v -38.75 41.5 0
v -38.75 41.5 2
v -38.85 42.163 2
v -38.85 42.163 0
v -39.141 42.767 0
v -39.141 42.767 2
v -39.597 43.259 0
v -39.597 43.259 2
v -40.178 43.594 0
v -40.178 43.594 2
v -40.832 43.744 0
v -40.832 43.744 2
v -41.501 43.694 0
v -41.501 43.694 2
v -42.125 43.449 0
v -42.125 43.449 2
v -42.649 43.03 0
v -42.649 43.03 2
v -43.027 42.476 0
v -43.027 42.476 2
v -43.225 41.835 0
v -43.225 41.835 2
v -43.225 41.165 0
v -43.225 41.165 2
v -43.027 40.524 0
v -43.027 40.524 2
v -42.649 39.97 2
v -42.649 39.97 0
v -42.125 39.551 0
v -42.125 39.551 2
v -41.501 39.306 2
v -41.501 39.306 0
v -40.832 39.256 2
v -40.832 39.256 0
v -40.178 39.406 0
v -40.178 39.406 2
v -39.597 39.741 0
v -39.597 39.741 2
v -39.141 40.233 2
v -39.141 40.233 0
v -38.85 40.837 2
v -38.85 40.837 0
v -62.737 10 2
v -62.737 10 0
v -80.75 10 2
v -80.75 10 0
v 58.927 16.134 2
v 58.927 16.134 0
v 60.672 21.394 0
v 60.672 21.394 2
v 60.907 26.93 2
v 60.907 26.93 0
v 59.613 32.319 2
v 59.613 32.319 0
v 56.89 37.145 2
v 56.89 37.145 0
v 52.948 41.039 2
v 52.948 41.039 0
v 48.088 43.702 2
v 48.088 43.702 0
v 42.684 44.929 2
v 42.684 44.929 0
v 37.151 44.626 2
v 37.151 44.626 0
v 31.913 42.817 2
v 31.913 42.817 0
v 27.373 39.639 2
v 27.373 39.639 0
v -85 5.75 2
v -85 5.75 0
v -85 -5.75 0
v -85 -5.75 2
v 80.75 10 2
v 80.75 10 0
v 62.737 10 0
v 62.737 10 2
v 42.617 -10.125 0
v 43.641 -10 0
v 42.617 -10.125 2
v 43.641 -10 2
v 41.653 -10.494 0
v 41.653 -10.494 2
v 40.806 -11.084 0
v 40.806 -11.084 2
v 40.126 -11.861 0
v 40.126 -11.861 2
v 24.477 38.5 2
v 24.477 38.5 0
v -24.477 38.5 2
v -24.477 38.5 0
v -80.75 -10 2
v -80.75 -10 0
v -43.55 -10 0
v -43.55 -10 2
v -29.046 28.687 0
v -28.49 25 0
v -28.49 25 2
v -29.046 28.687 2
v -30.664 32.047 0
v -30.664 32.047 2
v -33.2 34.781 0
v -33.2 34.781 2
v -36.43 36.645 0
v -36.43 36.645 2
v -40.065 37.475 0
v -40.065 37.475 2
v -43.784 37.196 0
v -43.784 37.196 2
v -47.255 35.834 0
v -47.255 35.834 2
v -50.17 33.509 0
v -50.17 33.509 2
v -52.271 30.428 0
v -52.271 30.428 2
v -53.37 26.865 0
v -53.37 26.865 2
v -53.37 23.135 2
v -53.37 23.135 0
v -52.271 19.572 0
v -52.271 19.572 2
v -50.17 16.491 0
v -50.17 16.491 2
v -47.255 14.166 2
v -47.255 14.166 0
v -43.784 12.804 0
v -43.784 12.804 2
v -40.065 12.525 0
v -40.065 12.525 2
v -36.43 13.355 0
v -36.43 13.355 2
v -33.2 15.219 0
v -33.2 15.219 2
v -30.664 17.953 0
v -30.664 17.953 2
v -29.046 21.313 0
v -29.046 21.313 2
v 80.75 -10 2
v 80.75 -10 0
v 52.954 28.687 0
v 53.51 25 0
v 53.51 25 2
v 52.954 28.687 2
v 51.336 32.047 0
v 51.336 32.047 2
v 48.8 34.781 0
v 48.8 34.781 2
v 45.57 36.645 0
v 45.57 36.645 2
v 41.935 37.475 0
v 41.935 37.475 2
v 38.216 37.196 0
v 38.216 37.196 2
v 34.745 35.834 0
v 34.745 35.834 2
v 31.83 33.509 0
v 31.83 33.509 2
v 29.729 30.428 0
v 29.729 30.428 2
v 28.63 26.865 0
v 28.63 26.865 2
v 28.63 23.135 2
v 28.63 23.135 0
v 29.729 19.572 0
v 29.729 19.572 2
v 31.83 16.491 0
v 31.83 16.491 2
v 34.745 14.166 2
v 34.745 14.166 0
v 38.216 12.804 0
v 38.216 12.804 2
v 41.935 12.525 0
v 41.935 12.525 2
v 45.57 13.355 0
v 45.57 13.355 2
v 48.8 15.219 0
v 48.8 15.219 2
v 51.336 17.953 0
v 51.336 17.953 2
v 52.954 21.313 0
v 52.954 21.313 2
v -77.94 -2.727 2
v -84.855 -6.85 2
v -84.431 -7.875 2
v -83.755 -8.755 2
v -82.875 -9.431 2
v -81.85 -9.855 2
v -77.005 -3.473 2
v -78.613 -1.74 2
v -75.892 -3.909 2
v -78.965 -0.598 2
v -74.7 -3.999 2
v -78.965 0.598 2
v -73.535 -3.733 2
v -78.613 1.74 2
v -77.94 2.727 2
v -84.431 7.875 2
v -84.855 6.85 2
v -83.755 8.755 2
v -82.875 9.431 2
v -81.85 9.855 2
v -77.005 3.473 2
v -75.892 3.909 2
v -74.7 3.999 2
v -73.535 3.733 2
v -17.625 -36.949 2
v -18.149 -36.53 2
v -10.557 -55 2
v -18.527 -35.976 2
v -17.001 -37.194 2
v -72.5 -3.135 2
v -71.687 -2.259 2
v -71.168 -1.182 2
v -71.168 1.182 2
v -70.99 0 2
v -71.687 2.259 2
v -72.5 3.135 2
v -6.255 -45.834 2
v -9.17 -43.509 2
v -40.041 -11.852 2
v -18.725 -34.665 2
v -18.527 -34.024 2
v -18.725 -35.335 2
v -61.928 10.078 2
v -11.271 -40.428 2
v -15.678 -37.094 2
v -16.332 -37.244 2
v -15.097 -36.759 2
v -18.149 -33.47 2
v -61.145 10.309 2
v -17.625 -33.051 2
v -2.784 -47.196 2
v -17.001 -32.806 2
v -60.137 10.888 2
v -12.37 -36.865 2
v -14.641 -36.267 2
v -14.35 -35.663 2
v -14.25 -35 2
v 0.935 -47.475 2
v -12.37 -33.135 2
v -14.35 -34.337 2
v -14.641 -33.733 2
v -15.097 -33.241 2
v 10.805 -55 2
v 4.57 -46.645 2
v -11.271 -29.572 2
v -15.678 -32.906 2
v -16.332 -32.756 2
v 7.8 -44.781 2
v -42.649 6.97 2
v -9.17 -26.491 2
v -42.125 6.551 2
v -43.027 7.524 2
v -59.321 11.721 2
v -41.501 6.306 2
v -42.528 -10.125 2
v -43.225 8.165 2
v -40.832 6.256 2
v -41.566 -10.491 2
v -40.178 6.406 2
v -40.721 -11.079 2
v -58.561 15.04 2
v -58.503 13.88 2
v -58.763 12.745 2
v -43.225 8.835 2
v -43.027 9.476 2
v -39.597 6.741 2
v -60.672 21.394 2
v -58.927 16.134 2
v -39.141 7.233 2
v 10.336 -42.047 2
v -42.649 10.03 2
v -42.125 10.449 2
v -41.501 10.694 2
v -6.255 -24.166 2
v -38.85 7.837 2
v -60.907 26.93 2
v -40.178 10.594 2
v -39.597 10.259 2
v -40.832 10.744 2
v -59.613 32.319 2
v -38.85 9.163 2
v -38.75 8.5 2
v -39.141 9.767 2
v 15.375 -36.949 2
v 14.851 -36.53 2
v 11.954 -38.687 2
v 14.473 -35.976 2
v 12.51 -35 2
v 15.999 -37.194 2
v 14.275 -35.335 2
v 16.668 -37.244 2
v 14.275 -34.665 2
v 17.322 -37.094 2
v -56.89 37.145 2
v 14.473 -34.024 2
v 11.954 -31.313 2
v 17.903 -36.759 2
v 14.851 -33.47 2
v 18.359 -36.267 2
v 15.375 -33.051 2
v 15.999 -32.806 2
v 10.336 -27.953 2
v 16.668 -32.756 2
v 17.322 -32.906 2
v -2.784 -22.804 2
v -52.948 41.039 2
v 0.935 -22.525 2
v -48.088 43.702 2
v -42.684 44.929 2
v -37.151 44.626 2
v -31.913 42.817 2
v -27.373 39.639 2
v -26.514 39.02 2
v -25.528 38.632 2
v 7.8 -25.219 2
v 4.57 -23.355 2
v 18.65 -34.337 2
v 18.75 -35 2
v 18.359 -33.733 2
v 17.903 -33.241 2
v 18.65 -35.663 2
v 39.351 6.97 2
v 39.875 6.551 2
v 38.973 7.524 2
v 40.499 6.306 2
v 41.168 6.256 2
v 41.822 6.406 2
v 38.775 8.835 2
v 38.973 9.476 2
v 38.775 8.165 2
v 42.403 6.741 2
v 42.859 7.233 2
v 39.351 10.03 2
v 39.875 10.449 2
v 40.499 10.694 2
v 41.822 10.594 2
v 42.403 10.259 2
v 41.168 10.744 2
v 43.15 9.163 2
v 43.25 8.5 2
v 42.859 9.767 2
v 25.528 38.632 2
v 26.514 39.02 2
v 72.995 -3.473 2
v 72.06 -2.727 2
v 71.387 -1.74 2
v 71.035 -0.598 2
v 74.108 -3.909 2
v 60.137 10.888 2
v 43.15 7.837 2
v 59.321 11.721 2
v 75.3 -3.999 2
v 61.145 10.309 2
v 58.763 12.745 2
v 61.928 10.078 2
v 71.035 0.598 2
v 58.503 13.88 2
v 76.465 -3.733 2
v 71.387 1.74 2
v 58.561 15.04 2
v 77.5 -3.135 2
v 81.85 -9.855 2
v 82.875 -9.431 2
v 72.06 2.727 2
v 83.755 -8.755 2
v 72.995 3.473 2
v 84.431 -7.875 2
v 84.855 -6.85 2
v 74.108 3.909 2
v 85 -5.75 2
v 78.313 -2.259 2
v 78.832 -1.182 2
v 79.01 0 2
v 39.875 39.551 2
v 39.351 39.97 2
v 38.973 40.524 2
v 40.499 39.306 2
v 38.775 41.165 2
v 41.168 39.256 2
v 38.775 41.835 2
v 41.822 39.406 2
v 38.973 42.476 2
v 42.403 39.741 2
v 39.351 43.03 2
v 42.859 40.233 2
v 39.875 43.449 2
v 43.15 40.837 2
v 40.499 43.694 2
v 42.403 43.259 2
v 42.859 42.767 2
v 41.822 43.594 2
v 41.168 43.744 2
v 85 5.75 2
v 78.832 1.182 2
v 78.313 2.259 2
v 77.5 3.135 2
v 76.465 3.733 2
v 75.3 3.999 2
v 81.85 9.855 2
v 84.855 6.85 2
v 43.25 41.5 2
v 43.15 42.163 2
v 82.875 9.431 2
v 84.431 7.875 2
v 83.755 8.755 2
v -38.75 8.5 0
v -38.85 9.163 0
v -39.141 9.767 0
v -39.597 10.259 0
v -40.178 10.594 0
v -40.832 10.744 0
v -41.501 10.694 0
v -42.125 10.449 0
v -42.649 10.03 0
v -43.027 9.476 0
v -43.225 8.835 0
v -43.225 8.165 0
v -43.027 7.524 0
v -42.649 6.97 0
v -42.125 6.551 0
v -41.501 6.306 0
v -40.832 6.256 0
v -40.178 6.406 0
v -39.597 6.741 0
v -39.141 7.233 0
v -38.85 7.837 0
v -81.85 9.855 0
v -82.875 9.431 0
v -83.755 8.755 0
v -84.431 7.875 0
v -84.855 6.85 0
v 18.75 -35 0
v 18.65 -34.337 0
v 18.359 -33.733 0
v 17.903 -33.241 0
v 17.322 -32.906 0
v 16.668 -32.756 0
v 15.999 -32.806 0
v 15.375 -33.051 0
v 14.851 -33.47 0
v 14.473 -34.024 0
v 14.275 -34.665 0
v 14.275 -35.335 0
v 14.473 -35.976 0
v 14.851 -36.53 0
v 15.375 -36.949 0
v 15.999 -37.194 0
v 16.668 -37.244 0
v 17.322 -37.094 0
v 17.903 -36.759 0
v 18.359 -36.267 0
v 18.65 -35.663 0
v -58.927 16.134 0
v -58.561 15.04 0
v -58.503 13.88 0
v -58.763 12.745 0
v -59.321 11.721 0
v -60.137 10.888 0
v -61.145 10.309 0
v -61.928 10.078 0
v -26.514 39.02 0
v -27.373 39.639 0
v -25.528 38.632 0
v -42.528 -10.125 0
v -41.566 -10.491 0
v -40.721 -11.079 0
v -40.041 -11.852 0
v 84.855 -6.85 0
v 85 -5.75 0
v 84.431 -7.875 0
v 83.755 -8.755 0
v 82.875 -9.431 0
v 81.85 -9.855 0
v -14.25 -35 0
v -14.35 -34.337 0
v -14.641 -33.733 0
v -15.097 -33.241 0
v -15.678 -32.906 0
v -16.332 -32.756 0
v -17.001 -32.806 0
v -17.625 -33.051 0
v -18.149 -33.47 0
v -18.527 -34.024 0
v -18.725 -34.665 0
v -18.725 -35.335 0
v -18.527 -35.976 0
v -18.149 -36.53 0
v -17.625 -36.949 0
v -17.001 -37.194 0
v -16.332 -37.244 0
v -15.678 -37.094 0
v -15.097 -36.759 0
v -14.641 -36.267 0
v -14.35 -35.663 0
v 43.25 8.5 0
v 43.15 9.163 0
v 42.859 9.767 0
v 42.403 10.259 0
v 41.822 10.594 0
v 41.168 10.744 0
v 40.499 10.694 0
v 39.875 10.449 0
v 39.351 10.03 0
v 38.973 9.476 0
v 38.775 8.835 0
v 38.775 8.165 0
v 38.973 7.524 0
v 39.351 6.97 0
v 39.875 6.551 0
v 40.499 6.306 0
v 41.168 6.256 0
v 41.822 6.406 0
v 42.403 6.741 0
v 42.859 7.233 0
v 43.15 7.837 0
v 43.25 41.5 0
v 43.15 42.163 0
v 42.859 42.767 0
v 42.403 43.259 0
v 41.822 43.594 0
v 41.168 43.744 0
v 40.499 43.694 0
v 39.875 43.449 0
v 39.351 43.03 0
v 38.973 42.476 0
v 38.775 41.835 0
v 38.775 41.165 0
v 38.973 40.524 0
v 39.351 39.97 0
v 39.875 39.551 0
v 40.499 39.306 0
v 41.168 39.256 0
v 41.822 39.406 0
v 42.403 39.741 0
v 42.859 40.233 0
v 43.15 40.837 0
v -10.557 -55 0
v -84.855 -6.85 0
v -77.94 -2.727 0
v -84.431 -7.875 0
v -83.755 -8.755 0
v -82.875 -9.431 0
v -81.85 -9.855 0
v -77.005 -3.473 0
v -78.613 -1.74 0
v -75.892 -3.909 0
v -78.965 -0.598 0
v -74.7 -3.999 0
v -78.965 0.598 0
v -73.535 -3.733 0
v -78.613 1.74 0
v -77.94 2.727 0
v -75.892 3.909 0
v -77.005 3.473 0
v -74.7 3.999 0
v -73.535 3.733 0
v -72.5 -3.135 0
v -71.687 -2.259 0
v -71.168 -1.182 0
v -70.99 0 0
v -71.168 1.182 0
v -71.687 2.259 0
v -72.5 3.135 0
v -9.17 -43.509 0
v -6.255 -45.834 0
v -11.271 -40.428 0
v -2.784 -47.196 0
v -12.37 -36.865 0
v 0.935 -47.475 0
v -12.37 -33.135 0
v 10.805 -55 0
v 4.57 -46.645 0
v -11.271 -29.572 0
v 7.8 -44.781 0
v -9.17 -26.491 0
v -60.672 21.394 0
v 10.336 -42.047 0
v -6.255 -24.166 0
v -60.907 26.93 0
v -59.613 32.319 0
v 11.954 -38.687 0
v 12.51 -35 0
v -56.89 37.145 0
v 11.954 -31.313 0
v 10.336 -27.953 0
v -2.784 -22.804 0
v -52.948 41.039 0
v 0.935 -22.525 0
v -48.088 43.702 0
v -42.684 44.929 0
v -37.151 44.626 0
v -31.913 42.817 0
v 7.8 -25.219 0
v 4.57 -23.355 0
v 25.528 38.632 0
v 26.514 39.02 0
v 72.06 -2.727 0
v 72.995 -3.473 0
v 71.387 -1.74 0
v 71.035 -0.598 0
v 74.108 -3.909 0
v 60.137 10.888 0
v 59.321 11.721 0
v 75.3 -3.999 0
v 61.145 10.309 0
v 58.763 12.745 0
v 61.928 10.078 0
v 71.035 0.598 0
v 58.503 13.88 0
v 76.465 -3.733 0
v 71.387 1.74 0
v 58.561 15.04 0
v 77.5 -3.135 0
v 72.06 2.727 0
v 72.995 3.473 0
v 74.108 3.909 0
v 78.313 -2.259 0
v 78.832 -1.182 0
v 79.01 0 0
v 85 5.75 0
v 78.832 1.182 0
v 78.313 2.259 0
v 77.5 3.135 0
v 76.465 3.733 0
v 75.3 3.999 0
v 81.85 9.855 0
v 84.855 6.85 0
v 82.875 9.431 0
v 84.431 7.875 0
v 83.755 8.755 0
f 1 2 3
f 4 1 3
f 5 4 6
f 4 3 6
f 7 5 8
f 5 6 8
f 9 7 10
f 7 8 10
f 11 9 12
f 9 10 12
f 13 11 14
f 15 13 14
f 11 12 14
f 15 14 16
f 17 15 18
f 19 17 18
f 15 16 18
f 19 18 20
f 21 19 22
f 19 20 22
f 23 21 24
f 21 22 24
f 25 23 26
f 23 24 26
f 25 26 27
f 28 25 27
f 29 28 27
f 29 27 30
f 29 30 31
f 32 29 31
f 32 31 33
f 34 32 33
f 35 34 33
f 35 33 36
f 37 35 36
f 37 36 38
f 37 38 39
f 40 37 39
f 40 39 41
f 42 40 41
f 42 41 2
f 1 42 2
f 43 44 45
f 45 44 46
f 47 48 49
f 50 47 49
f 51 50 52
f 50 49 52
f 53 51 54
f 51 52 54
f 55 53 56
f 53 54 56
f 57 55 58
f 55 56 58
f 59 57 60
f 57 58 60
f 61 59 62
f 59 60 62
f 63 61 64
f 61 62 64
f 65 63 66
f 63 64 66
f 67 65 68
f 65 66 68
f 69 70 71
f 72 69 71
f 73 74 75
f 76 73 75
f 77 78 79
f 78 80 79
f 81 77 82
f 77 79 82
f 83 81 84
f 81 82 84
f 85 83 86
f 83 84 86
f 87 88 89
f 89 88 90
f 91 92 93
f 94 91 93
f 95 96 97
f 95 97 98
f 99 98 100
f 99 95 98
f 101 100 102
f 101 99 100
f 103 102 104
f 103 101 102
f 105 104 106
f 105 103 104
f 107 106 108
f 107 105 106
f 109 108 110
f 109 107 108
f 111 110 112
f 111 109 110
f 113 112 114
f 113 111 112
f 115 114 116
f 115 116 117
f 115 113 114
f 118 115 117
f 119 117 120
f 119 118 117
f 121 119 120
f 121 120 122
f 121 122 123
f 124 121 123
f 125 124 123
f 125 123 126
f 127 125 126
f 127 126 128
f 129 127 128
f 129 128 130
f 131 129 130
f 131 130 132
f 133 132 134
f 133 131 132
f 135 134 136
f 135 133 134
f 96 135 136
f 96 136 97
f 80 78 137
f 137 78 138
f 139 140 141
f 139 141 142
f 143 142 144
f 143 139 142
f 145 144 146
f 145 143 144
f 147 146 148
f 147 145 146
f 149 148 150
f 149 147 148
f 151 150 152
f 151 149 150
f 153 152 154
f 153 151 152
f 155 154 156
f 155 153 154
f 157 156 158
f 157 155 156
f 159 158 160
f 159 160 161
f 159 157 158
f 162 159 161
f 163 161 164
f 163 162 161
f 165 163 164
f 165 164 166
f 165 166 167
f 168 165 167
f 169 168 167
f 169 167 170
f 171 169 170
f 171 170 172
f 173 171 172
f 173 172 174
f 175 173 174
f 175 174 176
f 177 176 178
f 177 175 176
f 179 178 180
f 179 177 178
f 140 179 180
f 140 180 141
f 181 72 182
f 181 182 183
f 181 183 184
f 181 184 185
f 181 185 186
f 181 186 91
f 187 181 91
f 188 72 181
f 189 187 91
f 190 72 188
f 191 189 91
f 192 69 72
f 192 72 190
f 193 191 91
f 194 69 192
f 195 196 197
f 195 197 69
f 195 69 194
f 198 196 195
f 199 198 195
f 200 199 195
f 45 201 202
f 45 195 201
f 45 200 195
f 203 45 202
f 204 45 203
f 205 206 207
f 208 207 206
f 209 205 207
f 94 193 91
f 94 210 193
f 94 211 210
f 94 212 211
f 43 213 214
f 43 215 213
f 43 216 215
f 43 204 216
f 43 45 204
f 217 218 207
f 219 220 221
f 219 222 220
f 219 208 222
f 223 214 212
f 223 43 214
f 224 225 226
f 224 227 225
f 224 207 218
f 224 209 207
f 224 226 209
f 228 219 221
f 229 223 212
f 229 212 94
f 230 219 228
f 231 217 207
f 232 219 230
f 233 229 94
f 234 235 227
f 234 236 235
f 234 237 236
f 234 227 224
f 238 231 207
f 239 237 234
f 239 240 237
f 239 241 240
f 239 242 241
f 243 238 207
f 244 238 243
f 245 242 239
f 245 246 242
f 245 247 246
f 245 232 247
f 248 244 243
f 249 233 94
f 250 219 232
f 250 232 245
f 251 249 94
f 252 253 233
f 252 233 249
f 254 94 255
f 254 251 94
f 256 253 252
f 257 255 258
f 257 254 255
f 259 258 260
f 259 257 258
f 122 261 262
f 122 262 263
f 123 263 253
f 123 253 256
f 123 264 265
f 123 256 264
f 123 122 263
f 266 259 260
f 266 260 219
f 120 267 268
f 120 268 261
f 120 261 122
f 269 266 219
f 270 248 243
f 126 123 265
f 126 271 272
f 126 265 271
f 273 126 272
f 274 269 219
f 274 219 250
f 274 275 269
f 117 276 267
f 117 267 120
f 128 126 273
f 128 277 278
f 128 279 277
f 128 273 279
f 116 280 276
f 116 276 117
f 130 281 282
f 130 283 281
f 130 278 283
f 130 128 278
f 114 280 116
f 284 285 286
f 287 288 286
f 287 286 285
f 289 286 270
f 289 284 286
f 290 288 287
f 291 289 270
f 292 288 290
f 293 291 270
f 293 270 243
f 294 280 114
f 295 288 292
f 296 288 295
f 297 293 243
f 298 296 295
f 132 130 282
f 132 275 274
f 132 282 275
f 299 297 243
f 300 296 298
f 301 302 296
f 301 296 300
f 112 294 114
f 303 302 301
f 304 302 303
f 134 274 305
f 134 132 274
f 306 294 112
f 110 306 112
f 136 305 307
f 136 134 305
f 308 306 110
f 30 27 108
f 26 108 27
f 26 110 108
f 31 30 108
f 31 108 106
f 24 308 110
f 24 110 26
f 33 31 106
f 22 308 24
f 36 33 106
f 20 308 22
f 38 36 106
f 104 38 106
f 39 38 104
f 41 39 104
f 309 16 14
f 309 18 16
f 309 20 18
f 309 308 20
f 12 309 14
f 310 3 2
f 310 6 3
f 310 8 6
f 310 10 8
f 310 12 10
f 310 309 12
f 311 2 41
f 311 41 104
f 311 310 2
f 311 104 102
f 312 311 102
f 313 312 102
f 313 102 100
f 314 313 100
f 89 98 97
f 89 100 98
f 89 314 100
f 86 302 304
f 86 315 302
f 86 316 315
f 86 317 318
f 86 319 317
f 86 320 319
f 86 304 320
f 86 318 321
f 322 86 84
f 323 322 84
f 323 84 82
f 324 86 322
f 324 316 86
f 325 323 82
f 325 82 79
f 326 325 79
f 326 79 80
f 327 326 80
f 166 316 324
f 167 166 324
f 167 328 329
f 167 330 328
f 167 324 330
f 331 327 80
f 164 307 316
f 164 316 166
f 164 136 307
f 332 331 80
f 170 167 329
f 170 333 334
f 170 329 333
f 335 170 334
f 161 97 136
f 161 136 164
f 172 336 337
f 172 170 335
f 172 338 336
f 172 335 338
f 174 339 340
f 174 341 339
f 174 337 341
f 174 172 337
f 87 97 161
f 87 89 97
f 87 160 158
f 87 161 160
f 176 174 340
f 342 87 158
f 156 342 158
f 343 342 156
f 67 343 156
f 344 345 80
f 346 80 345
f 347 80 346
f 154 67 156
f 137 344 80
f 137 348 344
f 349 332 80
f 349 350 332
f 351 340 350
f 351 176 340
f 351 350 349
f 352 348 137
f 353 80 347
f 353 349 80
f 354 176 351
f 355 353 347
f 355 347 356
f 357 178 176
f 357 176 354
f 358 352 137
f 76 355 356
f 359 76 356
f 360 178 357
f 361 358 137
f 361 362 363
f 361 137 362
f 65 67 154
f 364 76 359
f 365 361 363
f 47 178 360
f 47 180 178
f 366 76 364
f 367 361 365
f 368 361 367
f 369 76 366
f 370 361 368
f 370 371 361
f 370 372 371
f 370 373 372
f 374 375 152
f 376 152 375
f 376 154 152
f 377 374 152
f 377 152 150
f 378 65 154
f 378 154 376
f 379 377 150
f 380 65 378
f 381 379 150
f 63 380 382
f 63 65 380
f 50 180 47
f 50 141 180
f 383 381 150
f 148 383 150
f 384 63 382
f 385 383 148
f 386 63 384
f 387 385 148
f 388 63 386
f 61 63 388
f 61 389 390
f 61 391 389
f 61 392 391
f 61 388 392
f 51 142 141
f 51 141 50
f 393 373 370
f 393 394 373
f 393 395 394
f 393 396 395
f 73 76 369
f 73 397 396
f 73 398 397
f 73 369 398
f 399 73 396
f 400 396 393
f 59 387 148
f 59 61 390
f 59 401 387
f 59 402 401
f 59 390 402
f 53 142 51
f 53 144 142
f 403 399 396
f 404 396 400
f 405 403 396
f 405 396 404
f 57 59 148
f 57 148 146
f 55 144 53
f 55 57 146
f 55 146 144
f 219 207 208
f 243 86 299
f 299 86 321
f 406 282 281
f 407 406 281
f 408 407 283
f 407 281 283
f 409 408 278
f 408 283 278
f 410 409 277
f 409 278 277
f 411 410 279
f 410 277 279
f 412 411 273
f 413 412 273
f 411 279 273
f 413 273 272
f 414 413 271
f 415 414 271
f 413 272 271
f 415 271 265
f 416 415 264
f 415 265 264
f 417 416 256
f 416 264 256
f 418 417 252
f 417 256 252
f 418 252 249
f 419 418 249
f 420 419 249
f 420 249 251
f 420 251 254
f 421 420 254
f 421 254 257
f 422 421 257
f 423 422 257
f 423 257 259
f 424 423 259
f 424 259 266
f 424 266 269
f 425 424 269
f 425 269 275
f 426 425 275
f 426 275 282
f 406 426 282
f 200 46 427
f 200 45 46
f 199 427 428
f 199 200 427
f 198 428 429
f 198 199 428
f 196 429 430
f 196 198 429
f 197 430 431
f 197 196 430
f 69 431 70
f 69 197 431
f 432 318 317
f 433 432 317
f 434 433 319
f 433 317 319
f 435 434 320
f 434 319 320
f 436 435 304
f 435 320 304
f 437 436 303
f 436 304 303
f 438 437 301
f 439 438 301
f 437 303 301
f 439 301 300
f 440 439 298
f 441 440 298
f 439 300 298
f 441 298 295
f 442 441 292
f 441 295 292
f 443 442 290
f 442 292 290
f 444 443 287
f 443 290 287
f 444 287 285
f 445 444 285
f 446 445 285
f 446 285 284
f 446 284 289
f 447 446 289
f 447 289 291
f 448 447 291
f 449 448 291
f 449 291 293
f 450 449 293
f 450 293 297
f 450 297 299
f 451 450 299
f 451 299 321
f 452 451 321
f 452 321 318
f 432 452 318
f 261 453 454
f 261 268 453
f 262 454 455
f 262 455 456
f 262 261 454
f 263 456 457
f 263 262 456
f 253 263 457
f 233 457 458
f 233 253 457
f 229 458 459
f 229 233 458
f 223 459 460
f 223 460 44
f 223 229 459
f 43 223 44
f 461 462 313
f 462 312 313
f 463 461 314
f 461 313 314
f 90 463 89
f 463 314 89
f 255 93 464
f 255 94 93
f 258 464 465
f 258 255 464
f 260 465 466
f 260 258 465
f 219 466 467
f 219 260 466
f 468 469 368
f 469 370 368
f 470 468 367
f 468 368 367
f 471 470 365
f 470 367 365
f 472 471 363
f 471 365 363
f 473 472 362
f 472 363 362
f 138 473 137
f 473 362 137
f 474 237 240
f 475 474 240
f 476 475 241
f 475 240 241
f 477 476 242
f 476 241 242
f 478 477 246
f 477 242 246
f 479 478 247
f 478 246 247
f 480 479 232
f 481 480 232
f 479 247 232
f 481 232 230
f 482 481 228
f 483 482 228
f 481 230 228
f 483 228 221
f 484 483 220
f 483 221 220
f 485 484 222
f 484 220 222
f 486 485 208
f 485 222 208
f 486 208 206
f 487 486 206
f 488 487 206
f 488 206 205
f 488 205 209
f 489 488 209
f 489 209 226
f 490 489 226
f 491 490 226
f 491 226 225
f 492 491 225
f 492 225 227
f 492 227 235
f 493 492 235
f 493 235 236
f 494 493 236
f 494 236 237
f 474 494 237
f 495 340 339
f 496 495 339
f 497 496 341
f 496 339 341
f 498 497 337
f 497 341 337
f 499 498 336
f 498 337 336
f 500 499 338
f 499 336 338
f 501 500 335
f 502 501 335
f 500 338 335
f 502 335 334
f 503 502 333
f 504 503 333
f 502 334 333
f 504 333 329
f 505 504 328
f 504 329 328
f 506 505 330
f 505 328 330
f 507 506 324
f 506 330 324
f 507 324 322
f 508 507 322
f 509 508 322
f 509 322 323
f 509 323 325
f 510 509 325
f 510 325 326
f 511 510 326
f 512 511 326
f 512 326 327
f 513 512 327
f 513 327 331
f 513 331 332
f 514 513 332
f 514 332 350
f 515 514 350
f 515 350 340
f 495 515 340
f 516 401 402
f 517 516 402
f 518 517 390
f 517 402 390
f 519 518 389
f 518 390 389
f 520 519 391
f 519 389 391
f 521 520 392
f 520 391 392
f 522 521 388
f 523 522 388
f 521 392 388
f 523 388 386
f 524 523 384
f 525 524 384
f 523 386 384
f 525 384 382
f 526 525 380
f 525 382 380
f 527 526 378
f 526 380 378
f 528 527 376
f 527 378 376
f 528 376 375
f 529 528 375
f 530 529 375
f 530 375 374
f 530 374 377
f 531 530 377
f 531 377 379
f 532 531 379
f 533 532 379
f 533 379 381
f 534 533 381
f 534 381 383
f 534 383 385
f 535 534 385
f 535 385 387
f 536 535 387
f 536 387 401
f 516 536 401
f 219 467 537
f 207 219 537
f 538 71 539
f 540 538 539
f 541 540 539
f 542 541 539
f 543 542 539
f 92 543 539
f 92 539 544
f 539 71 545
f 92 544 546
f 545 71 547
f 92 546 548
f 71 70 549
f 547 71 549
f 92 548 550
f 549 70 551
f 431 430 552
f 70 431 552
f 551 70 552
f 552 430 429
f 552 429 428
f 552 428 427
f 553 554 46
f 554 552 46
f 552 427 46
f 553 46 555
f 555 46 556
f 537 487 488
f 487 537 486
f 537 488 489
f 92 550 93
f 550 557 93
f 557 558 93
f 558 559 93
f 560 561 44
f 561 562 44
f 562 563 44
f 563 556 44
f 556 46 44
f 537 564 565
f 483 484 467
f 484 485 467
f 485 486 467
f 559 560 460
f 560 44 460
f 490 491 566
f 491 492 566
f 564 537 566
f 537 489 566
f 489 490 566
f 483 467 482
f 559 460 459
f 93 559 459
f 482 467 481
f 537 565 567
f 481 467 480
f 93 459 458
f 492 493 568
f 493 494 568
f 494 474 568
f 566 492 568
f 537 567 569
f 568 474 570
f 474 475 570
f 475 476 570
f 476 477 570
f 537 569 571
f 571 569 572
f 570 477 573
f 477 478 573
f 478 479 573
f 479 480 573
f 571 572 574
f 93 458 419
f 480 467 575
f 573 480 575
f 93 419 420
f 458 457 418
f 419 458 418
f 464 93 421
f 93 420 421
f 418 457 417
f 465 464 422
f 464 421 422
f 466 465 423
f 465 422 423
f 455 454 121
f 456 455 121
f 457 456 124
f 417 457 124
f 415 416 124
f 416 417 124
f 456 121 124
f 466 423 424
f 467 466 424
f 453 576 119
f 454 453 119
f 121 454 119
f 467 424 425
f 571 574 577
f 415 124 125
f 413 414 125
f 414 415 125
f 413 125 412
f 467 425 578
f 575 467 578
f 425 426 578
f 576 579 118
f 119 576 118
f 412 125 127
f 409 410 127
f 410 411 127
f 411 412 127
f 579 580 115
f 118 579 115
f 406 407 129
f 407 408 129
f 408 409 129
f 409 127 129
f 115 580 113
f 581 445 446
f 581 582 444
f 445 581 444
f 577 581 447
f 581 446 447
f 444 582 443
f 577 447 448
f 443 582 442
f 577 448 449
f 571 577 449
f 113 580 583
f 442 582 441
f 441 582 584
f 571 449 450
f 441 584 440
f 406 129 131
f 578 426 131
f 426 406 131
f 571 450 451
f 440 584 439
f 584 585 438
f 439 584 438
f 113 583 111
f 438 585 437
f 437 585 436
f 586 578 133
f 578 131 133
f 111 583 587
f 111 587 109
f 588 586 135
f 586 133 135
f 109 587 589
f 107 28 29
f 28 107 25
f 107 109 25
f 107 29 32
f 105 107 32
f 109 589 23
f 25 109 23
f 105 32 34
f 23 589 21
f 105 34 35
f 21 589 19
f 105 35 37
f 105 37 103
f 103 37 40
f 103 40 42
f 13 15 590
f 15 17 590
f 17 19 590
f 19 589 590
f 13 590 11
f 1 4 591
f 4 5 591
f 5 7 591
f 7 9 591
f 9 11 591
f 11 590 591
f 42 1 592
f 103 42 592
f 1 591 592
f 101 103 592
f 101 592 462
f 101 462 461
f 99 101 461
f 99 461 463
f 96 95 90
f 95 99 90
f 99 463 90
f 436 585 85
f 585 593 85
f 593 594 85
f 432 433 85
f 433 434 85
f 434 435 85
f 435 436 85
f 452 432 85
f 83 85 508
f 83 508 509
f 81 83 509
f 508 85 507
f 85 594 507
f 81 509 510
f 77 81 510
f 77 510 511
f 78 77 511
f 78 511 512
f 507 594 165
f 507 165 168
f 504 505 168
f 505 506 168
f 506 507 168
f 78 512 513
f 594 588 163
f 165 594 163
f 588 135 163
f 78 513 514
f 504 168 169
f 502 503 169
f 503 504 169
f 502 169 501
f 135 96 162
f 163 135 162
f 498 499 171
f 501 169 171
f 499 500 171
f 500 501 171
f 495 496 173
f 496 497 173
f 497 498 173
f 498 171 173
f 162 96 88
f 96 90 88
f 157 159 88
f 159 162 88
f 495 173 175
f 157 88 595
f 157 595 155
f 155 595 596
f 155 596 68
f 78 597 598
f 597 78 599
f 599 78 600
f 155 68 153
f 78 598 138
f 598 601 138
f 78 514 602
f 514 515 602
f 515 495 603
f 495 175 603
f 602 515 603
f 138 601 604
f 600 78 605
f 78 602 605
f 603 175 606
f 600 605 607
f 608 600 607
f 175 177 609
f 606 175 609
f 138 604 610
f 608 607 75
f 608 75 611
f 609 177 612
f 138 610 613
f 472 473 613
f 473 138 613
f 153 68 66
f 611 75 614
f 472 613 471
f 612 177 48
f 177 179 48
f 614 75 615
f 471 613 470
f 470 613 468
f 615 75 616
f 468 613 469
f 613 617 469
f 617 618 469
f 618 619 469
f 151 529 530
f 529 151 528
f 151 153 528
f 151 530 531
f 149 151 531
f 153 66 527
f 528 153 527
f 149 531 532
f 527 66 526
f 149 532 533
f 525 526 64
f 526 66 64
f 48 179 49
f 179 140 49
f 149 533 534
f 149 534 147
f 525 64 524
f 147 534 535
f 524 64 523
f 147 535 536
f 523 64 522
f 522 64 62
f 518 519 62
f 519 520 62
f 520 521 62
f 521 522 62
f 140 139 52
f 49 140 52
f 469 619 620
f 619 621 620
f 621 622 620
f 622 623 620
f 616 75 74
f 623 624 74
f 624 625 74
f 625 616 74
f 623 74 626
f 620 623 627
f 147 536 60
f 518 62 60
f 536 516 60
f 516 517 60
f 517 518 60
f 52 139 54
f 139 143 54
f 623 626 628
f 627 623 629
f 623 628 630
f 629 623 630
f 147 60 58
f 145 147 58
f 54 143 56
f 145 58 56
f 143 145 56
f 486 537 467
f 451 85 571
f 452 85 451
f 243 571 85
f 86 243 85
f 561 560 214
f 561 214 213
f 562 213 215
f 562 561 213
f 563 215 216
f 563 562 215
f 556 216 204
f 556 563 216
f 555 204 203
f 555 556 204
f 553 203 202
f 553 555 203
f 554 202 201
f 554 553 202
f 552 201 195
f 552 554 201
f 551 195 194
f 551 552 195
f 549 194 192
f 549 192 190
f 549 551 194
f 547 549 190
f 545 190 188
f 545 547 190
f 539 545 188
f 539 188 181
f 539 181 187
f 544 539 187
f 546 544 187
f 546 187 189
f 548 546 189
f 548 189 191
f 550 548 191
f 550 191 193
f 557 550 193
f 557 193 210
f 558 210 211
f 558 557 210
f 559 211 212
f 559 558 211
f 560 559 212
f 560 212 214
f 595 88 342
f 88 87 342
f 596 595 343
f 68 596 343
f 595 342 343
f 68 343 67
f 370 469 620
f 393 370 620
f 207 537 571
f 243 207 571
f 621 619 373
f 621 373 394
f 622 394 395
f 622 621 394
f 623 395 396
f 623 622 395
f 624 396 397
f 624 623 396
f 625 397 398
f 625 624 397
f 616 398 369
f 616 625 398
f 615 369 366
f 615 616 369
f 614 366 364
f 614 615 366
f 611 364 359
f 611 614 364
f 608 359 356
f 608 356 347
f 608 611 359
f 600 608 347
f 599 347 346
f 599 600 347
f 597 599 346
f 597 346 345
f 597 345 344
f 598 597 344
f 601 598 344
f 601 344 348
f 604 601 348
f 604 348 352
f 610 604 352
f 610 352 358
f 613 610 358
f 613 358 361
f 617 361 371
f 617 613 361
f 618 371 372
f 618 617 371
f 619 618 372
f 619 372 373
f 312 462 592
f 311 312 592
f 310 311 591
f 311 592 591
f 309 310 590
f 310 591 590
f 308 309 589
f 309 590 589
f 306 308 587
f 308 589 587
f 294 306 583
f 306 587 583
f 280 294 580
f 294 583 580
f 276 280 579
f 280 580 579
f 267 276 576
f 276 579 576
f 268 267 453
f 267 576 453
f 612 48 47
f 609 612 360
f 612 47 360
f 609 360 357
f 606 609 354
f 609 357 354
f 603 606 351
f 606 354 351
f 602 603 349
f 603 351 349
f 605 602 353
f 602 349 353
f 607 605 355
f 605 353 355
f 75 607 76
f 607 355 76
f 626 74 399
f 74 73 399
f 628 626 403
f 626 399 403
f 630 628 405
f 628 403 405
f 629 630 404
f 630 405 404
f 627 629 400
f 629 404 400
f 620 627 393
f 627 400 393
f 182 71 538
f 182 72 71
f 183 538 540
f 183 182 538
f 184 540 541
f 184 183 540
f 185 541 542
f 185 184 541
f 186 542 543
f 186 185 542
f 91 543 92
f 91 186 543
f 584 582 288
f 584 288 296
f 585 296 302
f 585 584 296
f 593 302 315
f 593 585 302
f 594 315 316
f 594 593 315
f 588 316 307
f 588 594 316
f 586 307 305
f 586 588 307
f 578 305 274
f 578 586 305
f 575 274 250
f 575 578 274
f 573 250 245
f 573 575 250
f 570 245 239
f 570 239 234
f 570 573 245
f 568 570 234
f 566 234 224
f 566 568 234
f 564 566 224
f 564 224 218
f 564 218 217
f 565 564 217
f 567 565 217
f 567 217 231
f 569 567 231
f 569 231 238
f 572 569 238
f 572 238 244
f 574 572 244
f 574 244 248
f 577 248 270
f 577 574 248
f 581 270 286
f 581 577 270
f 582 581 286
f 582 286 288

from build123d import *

# Parameters (mm, degrees)
SKETCH1_R           = 12.51
SKETCH1_R_2         = 4.01
BOSS_EXTRUDE1_DEPTH = 2
FILLET1_R           = 4.25
CUT_EXTRUDE1_REACH  = 4
SKETCH2_R           = 2.25


with BuildPart() as part:
    # Sketch1 → Boss-Extrude1 (new body)
    with BuildSketch(Plane.XY):
        with BuildLine():
            ThreePointArc((-26.243645437, 38.5), (-53.422989473, 40.673842303), (-57.51289283, 13.716189899))
            Line((-57.51289283, 13.716189899), (-54.973496399, 10))
            Line((-54.973496399, 10), (-85, 10))
            Line((-85, 10), (-85, -10))
            Line((-85, -10), (-41.306829732, -10))
            Line((-41.306829732, -10), (-10.556829732, -55))
            Line((-10.556829732, -55), (10.805406659, -55))
            Line((10.805406659, -55), (41.391170475, -10))
            Line((41.391170475, -10), (85, -10))
            Line((85, -10), (85, 10))
            Line((85, 10), (54.984843282, 10))
            Line((54.984843282, 10), (57.38463841, 13.530753113))
            ThreePointArc((57.38463841, 13.530753113), (53.511141019, 40.603568515), (26.243645437, 38.5))
            Line((26.243645437, 38.5), (-26.243645437, 38.5))
        make_face()
        with Locations((0, -35)):
            Circle(SKETCH1_R, mode=Mode.SUBTRACT)
        with Locations((-75, 0)):
            Circle(SKETCH1_R_2, mode=Mode.SUBTRACT)
        with Locations((-41, 25)):
            Circle(SKETCH1_R, mode=Mode.SUBTRACT)
        with Locations((75, 0)):
            Circle(SKETCH1_R_2, mode=Mode.SUBTRACT)
        with Locations((41, 25)):
            Circle(SKETCH1_R, mode=Mode.SUBTRACT)
    extrude(amount=BOSS_EXTRUDE1_DEPTH)

    # Fillet1
    fillet1_edges = [part.edges().sort_by_distance(p)[0] for p in [
        (-85, -10, 1),
        (-85, 10, 1),
        (85, -10, 1),
        (85, 10, 1),
        (54.984843282, 10, 1),
        (-54.973496399, 10, 1),
        (41.391170475, -10, 1),
        (-41.306829732, -10, 1),
        (26.243645437, 38.5, 1),
        (-26.243645437, 38.5, 1),
    ]]
    fillet(fillet1_edges, radius=FILLET1_R)

    # Sketch2 → Cut-Extrude1 (cut, up to next)
    with BuildSketch(Plane.XY.offset(2), mode=Mode.PRIVATE) as cut_extrude1_sk1:
        with Locations((-41, 41.5)):
            Circle(SKETCH2_R)
    cut_extrude1_tool1 = extrude(cut_extrude1_sk1.sketch, amount=-CUT_EXTRUDE1_REACH, mode=Mode.PRIVATE) & part.part
    add(cut_extrude1_tool1.solids().sort_by_distance((-41, 41.5, 2))[0], mode=Mode.SUBTRACT)
    # Sketch2 → Cut-Extrude1 (cut, up to next)
    with BuildSketch(Plane.XY.offset(2), mode=Mode.PRIVATE) as cut_extrude1_sk2:
        with Locations((-41, 8.5)):
            Circle(SKETCH2_R)
    cut_extrude1_tool2 = extrude(cut_extrude1_sk2.sketch, amount=-CUT_EXTRUDE1_REACH, mode=Mode.PRIVATE) & part.part
    add(cut_extrude1_tool2.solids().sort_by_distance((-41, 8.5, 2))[0], mode=Mode.SUBTRACT)
    # Sketch2 → Cut-Extrude1 (cut, up to next)
    with BuildSketch(Plane.XY.offset(2), mode=Mode.PRIVATE) as cut_extrude1_sk3:
        with Locations((-16.5, -35)):
            Circle(SKETCH2_R)
    cut_extrude1_tool3 = extrude(cut_extrude1_sk3.sketch, amount=-CUT_EXTRUDE1_REACH, mode=Mode.PRIVATE) & part.part
    add(cut_extrude1_tool3.solids().sort_by_distance((-16.5, -35, 2))[0], mode=Mode.SUBTRACT)
    # Sketch2 → Cut-Extrude1 (cut, up to next)
    with BuildSketch(Plane.XY.offset(2), mode=Mode.PRIVATE) as cut_extrude1_sk4:
        with Locations((16.5, -35)):
            Circle(SKETCH2_R)
    cut_extrude1_tool4 = extrude(cut_extrude1_sk4.sketch, amount=-CUT_EXTRUDE1_REACH, mode=Mode.PRIVATE) & part.part
    add(cut_extrude1_tool4.solids().sort_by_distance((16.5, -35, 2))[0], mode=Mode.SUBTRACT)
    # Sketch2 → Cut-Extrude1 (cut, up to next)
    with BuildSketch(Plane.XY.offset(2), mode=Mode.PRIVATE) as cut_extrude1_sk5:
        with Locations((41, 8.5)):
            Circle(SKETCH2_R)
    cut_extrude1_tool5 = extrude(cut_extrude1_sk5.sketch, amount=-CUT_EXTRUDE1_REACH, mode=Mode.PRIVATE) & part.part
    add(cut_extrude1_tool5.solids().sort_by_distance((41, 8.5, 2))[0], mode=Mode.SUBTRACT)
    # Sketch2 → Cut-Extrude1 (cut, up to next)
    with BuildSketch(Plane.XY.offset(2), mode=Mode.PRIVATE) as cut_extrude1_sk6:
        with Locations((41, 41.5)):
            Circle(SKETCH2_R)
    cut_extrude1_tool6 = extrude(cut_extrude1_sk6.sketch, amount=-CUT_EXTRUDE1_REACH, mode=Mode.PRIVATE) & part.part
    add(cut_extrude1_tool6.solids().sort_by_distance((41, 41.5, 2))[0], mode=Mode.SUBTRACT)


solid = part.part
